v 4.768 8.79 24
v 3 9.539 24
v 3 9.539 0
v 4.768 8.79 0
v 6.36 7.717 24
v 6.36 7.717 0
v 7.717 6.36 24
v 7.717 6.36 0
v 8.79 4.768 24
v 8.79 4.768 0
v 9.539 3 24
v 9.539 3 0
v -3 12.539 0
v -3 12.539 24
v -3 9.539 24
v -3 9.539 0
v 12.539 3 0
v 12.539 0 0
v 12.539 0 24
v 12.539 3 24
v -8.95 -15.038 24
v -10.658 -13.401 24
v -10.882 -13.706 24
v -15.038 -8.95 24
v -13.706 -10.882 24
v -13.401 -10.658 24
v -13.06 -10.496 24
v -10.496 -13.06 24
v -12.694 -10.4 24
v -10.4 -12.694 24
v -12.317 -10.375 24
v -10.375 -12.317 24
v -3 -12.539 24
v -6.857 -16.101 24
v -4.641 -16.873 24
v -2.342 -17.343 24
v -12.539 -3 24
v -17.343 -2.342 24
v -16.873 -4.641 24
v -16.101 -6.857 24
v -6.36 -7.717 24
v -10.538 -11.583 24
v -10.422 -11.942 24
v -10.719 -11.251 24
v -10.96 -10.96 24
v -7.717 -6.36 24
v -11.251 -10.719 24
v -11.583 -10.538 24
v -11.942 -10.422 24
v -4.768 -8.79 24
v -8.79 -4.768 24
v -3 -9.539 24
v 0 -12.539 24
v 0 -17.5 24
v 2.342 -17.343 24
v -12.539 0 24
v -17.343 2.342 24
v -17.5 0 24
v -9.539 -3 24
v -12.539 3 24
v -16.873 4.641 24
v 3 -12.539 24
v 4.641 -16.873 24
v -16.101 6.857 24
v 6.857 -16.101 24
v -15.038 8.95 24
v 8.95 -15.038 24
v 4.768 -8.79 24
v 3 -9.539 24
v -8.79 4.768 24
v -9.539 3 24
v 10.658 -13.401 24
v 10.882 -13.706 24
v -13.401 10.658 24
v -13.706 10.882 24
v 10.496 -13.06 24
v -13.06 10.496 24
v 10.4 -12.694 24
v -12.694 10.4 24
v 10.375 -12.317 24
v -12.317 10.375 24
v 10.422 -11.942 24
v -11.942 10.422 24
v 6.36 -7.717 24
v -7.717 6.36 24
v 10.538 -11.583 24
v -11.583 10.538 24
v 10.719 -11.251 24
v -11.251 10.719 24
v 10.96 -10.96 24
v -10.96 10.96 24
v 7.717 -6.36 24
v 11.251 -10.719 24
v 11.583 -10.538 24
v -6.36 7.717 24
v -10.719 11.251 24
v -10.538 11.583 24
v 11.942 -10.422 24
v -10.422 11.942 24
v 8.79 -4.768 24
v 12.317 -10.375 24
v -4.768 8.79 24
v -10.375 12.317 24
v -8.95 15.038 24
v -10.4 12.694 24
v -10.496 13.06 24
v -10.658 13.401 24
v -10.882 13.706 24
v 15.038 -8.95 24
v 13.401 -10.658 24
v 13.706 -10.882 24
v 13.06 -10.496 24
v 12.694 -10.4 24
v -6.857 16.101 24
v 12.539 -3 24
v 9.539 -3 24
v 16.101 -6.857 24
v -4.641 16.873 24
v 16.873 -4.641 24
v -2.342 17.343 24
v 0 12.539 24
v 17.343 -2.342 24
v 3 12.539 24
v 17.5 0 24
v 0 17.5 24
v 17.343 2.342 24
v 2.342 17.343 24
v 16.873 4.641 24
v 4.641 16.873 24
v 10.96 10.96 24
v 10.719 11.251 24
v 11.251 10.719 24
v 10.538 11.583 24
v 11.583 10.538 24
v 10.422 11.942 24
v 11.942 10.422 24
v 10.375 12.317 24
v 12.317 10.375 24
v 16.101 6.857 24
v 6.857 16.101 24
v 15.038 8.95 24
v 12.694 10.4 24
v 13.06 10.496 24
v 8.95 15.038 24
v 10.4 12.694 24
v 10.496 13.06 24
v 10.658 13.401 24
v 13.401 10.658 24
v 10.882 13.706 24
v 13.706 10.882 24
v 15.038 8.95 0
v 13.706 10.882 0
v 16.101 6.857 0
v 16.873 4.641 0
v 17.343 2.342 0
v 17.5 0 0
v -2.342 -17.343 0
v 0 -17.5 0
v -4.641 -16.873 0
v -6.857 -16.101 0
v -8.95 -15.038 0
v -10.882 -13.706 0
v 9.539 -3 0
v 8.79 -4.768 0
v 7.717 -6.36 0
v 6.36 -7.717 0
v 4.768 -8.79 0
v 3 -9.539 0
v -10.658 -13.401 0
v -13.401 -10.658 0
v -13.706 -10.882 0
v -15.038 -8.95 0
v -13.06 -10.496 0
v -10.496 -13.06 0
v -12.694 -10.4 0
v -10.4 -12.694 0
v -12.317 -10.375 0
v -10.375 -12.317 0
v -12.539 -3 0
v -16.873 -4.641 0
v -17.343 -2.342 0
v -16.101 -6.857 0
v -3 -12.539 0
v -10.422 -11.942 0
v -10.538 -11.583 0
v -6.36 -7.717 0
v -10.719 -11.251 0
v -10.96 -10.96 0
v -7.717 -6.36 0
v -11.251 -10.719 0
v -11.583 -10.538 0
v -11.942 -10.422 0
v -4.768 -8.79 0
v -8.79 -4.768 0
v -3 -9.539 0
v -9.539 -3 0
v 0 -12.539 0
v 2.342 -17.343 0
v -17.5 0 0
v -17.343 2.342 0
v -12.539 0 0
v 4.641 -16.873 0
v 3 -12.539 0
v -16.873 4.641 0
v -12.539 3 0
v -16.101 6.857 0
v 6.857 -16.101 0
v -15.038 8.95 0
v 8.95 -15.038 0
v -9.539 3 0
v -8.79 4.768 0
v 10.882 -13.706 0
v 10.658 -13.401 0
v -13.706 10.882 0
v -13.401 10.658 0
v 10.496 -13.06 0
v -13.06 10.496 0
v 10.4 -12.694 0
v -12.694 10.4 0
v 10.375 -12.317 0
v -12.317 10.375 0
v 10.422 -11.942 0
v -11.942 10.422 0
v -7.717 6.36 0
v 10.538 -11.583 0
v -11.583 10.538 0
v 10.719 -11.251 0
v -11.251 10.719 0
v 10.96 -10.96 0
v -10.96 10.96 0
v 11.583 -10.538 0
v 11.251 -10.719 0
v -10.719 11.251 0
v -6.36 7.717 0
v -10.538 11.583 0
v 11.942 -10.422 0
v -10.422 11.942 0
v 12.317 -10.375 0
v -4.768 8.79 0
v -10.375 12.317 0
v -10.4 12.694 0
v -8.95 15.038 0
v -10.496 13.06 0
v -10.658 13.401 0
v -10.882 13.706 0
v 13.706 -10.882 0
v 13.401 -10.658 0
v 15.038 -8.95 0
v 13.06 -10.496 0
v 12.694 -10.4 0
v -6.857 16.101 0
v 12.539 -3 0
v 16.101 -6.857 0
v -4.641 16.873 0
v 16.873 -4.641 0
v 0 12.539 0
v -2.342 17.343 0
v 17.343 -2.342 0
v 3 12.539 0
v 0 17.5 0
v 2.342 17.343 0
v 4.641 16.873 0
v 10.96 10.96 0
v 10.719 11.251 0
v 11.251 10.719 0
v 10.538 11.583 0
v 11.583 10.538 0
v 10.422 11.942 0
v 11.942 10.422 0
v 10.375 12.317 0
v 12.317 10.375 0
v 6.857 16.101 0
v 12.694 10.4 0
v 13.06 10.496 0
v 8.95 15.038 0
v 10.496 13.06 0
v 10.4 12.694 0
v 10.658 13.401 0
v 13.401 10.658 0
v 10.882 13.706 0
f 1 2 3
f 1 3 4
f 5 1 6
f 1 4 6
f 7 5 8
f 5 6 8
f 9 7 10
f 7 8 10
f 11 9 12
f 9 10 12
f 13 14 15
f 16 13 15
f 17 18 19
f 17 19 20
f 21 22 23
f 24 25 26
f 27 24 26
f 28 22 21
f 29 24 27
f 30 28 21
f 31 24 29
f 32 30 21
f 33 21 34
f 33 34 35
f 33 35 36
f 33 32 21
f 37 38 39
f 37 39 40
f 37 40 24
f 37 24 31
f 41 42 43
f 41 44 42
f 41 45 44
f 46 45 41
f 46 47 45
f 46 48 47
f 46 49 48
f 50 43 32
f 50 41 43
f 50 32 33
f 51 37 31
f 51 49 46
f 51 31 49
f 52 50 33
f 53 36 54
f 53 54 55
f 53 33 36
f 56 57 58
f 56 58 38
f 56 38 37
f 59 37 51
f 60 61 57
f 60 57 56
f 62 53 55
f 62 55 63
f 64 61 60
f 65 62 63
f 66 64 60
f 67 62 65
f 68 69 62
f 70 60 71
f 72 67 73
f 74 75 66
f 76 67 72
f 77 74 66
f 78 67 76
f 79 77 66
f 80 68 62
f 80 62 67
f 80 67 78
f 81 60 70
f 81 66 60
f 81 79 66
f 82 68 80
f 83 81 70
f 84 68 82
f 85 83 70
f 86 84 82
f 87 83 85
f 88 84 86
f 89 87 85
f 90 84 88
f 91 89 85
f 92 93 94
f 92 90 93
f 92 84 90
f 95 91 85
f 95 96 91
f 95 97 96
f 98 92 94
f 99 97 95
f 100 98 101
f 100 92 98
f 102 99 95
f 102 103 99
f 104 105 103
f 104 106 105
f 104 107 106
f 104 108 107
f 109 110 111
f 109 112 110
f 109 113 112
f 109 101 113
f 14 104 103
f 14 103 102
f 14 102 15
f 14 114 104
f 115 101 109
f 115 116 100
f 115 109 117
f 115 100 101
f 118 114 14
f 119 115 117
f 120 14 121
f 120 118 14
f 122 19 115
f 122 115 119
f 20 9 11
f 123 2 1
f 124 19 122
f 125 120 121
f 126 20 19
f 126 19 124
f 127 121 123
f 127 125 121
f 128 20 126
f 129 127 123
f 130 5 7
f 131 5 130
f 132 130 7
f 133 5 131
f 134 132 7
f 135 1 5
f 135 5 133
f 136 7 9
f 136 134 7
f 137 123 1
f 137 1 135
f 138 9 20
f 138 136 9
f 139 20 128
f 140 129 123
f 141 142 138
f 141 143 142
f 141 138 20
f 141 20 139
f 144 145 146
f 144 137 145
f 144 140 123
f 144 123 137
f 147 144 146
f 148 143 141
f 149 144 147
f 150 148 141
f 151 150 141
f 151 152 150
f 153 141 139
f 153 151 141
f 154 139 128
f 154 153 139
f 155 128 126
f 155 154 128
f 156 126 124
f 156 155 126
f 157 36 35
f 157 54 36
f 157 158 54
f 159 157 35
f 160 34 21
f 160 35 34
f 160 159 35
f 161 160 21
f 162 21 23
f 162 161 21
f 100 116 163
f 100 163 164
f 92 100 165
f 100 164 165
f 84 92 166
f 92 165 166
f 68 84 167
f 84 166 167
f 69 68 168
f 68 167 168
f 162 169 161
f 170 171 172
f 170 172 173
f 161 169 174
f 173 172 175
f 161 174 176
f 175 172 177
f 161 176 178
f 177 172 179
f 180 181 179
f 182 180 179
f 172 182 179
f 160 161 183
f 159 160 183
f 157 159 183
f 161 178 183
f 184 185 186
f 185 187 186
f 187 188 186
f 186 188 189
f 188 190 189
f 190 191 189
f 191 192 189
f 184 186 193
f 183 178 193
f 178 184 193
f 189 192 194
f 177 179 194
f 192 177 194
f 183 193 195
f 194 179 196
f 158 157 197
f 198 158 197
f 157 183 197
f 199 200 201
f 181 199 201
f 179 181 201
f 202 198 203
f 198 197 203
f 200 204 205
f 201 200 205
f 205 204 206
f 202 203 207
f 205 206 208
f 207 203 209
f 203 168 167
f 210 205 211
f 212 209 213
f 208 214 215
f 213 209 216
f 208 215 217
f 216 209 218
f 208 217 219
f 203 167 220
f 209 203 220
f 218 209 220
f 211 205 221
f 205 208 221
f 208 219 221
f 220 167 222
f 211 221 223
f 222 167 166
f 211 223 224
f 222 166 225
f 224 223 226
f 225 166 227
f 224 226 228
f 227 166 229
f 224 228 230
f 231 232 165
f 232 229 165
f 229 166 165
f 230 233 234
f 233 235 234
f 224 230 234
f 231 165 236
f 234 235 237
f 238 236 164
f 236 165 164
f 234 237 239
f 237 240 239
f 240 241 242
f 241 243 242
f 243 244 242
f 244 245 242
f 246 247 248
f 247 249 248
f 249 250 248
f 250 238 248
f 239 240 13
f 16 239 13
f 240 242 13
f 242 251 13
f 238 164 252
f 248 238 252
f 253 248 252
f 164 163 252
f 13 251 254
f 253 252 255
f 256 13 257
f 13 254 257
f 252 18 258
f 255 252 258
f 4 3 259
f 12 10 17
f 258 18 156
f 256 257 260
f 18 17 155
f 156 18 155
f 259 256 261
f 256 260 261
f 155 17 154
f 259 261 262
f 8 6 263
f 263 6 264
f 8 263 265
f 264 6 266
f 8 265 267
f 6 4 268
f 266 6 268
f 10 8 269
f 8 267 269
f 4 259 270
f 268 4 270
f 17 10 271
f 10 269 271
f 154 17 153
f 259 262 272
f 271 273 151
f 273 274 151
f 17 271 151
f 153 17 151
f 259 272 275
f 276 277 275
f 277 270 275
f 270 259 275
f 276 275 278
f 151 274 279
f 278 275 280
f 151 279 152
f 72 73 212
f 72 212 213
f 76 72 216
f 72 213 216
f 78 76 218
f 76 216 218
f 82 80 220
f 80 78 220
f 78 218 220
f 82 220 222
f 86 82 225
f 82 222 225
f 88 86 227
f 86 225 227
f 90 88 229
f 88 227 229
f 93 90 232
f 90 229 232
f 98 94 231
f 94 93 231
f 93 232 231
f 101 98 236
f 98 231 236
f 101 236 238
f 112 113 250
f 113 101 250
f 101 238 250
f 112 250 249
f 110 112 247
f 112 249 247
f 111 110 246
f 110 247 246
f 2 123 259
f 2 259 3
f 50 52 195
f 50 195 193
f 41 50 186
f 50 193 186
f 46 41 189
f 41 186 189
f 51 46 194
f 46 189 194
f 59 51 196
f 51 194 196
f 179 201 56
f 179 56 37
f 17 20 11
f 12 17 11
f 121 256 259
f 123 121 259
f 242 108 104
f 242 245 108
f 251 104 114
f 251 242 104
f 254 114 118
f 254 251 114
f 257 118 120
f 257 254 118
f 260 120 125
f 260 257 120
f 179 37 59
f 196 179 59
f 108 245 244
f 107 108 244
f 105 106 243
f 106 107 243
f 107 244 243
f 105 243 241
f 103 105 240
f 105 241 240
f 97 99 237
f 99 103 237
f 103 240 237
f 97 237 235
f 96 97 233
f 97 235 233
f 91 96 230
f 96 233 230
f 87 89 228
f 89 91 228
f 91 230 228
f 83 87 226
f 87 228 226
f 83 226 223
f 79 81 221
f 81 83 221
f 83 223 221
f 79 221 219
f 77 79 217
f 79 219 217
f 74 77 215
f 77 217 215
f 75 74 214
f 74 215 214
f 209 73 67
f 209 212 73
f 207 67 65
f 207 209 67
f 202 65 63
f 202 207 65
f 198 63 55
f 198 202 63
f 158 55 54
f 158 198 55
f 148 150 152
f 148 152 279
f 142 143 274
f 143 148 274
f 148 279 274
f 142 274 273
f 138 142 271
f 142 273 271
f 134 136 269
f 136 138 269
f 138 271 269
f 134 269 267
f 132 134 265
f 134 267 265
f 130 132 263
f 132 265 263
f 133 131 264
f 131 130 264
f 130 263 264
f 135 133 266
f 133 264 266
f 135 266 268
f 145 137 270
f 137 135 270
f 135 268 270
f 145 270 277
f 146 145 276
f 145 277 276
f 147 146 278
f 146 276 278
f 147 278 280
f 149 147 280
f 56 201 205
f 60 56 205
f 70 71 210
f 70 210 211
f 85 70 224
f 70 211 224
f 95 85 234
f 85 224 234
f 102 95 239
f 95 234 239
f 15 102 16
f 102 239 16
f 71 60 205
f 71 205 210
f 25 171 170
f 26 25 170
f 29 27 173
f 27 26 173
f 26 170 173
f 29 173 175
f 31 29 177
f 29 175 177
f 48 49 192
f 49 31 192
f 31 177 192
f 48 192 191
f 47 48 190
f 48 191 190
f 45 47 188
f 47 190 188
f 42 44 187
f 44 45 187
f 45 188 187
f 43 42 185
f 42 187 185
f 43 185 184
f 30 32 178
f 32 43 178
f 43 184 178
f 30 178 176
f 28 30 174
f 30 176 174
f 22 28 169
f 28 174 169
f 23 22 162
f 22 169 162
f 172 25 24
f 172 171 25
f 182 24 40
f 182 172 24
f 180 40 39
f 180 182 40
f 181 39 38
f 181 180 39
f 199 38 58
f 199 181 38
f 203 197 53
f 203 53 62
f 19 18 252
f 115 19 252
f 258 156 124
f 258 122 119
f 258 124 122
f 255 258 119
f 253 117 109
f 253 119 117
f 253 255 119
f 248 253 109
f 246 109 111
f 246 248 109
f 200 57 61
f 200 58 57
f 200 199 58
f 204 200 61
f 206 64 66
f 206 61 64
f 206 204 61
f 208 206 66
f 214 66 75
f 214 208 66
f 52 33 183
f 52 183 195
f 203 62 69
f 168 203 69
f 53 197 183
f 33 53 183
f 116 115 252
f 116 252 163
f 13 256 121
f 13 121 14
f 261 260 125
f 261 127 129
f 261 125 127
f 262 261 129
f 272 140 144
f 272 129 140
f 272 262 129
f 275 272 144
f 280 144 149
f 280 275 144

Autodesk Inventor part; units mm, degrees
ref_plane "YZ Plane" through (0, 0, 0) normal (1, 0, 0) x (0, 1, 0)
ref_plane "XZ Plane" through (0, 0, 0) normal (0, 1, 0) x (-1, 0, 0)
ref_plane "XY Plane" through (0, 0, 0) normal (0, 0, 1) x (1, 0, 0)
sketch "Sketch1" plane through (0, 0, 0) normal (0, 0, 1) x (1, 0, 0)
  line L0 (-17.5, 0) -> (17.5, 0) construction
  line L1 (0, 12.4072) -> (0, -12.4072) construction
  line L2 (-12.5394, 0) -> (-12.5394, 3)
  line L3 (-12.5394, 3) -> (-9.5394, 3)
  line L4 (0, 12.5394) -> (-3, 12.5394)
  line L5 (-3, 12.5394) -> (-3, 9.5394)
  circle A0 centre (0, 0) radius 10 construction
  circle A1 centre (0, 0) radius 17.5 construction
  arc A2 (-3, 9.5394) -> (-9.5394, 3) centre (0, 0) ccw
  arc A3 (-13.7055, 10.8817) -> (-17.5, 0) centre (0, 0) ccw
  line L6 (0, 0) -> (-12.3744, 12.3744) construction
  line L7 (0, 0) -> (17.5, 0) construction
  arc A4 (0, 17.5) -> (-10.8817, 13.7055) centre (0, 0) ccw
  arc A5 (-13.7055, 10.8817) -> (-10.8817, 13.7055) centre (-12.3744, 12.3744) ccw
  line L8 (12.5394, 3) -> (9.5394, 3)
  line L9 (3, 12.5394) -> (3, 9.5394)
  arc A6 (9.5394, 3) -> (3, 9.5394) centre (0, 0) ccw
  arc A7 (10.8817, 13.7055) -> (13.7055, 10.8817) centre (12.3744, 12.3744) ccw
  line L10 (12.5394, 0) -> (12.5394, 3)
  line L11 (0, 12.5394) -> (3, 12.5394)
  arc A8 (17.5, 0) -> (13.7055, 10.8817) centre (0, 0) ccw
  arc A9 (10.8817, 13.7055) -> (0, 17.5) centre (0, 0) ccw
  line L12 (-12.5394, 0) -> (-12.5394, -3)
  line L13 (-12.5394, -3) -> (-9.5394, -3)
  line L14 (-3, -12.5394) -> (-3, -9.5394)
  arc A10 (-9.5394, -3) -> (-3, -9.5394) centre (0, 0) ccw
  arc A11 (-17.5, 0) -> (-13.7055, -10.8817) centre (0, 0) ccw
  arc A12 (-10.8817, -13.7055) -> (-13.7055, -10.8817) centre (-12.3744, -12.3744) ccw
  line L15 (0, -12.5394) -> (-3, -12.5394)
  line L16 (3, -12.5394) -> (3, -9.5394)
  arc A13 (3, -9.5394) -> (9.5394, -3) centre (0, 0) ccw
  line L17 (12.5394, -3) -> (9.5394, -3)
  line L18 (0, -12.5394) -> (3, -12.5394)
  line L19 (12.5394, 0) -> (12.5394, -3)
  arc A14 (13.7055, -10.8817) -> (17.5, 0) centre (0, 0) ccw
  arc A15 (0, -17.5) -> (10.8817, -13.7055) centre (0, 0) ccw
  arc A16 (13.7055, -10.8817) -> (10.8817, -13.7055) centre (12.3744, -12.3744) ccw
  arc A17 (-10.8817, -13.7055) -> (0, -17.5) centre (0, 0) ccw
  point P0 (12.3744, 12.3744)
  point P1 (-12.3744, -12.3744)
  point P2 (12.3744, -12.3744)
  dimension "d2" = 35
  dimension "d0" = 3
  dimension "d1" = 20
  dimension "d3" = 135
  dimension "d4" = 2
extrude "Extrusion1" add sketch "Sketch1" along normal blind 24
properties part number "shaft_spacer"
